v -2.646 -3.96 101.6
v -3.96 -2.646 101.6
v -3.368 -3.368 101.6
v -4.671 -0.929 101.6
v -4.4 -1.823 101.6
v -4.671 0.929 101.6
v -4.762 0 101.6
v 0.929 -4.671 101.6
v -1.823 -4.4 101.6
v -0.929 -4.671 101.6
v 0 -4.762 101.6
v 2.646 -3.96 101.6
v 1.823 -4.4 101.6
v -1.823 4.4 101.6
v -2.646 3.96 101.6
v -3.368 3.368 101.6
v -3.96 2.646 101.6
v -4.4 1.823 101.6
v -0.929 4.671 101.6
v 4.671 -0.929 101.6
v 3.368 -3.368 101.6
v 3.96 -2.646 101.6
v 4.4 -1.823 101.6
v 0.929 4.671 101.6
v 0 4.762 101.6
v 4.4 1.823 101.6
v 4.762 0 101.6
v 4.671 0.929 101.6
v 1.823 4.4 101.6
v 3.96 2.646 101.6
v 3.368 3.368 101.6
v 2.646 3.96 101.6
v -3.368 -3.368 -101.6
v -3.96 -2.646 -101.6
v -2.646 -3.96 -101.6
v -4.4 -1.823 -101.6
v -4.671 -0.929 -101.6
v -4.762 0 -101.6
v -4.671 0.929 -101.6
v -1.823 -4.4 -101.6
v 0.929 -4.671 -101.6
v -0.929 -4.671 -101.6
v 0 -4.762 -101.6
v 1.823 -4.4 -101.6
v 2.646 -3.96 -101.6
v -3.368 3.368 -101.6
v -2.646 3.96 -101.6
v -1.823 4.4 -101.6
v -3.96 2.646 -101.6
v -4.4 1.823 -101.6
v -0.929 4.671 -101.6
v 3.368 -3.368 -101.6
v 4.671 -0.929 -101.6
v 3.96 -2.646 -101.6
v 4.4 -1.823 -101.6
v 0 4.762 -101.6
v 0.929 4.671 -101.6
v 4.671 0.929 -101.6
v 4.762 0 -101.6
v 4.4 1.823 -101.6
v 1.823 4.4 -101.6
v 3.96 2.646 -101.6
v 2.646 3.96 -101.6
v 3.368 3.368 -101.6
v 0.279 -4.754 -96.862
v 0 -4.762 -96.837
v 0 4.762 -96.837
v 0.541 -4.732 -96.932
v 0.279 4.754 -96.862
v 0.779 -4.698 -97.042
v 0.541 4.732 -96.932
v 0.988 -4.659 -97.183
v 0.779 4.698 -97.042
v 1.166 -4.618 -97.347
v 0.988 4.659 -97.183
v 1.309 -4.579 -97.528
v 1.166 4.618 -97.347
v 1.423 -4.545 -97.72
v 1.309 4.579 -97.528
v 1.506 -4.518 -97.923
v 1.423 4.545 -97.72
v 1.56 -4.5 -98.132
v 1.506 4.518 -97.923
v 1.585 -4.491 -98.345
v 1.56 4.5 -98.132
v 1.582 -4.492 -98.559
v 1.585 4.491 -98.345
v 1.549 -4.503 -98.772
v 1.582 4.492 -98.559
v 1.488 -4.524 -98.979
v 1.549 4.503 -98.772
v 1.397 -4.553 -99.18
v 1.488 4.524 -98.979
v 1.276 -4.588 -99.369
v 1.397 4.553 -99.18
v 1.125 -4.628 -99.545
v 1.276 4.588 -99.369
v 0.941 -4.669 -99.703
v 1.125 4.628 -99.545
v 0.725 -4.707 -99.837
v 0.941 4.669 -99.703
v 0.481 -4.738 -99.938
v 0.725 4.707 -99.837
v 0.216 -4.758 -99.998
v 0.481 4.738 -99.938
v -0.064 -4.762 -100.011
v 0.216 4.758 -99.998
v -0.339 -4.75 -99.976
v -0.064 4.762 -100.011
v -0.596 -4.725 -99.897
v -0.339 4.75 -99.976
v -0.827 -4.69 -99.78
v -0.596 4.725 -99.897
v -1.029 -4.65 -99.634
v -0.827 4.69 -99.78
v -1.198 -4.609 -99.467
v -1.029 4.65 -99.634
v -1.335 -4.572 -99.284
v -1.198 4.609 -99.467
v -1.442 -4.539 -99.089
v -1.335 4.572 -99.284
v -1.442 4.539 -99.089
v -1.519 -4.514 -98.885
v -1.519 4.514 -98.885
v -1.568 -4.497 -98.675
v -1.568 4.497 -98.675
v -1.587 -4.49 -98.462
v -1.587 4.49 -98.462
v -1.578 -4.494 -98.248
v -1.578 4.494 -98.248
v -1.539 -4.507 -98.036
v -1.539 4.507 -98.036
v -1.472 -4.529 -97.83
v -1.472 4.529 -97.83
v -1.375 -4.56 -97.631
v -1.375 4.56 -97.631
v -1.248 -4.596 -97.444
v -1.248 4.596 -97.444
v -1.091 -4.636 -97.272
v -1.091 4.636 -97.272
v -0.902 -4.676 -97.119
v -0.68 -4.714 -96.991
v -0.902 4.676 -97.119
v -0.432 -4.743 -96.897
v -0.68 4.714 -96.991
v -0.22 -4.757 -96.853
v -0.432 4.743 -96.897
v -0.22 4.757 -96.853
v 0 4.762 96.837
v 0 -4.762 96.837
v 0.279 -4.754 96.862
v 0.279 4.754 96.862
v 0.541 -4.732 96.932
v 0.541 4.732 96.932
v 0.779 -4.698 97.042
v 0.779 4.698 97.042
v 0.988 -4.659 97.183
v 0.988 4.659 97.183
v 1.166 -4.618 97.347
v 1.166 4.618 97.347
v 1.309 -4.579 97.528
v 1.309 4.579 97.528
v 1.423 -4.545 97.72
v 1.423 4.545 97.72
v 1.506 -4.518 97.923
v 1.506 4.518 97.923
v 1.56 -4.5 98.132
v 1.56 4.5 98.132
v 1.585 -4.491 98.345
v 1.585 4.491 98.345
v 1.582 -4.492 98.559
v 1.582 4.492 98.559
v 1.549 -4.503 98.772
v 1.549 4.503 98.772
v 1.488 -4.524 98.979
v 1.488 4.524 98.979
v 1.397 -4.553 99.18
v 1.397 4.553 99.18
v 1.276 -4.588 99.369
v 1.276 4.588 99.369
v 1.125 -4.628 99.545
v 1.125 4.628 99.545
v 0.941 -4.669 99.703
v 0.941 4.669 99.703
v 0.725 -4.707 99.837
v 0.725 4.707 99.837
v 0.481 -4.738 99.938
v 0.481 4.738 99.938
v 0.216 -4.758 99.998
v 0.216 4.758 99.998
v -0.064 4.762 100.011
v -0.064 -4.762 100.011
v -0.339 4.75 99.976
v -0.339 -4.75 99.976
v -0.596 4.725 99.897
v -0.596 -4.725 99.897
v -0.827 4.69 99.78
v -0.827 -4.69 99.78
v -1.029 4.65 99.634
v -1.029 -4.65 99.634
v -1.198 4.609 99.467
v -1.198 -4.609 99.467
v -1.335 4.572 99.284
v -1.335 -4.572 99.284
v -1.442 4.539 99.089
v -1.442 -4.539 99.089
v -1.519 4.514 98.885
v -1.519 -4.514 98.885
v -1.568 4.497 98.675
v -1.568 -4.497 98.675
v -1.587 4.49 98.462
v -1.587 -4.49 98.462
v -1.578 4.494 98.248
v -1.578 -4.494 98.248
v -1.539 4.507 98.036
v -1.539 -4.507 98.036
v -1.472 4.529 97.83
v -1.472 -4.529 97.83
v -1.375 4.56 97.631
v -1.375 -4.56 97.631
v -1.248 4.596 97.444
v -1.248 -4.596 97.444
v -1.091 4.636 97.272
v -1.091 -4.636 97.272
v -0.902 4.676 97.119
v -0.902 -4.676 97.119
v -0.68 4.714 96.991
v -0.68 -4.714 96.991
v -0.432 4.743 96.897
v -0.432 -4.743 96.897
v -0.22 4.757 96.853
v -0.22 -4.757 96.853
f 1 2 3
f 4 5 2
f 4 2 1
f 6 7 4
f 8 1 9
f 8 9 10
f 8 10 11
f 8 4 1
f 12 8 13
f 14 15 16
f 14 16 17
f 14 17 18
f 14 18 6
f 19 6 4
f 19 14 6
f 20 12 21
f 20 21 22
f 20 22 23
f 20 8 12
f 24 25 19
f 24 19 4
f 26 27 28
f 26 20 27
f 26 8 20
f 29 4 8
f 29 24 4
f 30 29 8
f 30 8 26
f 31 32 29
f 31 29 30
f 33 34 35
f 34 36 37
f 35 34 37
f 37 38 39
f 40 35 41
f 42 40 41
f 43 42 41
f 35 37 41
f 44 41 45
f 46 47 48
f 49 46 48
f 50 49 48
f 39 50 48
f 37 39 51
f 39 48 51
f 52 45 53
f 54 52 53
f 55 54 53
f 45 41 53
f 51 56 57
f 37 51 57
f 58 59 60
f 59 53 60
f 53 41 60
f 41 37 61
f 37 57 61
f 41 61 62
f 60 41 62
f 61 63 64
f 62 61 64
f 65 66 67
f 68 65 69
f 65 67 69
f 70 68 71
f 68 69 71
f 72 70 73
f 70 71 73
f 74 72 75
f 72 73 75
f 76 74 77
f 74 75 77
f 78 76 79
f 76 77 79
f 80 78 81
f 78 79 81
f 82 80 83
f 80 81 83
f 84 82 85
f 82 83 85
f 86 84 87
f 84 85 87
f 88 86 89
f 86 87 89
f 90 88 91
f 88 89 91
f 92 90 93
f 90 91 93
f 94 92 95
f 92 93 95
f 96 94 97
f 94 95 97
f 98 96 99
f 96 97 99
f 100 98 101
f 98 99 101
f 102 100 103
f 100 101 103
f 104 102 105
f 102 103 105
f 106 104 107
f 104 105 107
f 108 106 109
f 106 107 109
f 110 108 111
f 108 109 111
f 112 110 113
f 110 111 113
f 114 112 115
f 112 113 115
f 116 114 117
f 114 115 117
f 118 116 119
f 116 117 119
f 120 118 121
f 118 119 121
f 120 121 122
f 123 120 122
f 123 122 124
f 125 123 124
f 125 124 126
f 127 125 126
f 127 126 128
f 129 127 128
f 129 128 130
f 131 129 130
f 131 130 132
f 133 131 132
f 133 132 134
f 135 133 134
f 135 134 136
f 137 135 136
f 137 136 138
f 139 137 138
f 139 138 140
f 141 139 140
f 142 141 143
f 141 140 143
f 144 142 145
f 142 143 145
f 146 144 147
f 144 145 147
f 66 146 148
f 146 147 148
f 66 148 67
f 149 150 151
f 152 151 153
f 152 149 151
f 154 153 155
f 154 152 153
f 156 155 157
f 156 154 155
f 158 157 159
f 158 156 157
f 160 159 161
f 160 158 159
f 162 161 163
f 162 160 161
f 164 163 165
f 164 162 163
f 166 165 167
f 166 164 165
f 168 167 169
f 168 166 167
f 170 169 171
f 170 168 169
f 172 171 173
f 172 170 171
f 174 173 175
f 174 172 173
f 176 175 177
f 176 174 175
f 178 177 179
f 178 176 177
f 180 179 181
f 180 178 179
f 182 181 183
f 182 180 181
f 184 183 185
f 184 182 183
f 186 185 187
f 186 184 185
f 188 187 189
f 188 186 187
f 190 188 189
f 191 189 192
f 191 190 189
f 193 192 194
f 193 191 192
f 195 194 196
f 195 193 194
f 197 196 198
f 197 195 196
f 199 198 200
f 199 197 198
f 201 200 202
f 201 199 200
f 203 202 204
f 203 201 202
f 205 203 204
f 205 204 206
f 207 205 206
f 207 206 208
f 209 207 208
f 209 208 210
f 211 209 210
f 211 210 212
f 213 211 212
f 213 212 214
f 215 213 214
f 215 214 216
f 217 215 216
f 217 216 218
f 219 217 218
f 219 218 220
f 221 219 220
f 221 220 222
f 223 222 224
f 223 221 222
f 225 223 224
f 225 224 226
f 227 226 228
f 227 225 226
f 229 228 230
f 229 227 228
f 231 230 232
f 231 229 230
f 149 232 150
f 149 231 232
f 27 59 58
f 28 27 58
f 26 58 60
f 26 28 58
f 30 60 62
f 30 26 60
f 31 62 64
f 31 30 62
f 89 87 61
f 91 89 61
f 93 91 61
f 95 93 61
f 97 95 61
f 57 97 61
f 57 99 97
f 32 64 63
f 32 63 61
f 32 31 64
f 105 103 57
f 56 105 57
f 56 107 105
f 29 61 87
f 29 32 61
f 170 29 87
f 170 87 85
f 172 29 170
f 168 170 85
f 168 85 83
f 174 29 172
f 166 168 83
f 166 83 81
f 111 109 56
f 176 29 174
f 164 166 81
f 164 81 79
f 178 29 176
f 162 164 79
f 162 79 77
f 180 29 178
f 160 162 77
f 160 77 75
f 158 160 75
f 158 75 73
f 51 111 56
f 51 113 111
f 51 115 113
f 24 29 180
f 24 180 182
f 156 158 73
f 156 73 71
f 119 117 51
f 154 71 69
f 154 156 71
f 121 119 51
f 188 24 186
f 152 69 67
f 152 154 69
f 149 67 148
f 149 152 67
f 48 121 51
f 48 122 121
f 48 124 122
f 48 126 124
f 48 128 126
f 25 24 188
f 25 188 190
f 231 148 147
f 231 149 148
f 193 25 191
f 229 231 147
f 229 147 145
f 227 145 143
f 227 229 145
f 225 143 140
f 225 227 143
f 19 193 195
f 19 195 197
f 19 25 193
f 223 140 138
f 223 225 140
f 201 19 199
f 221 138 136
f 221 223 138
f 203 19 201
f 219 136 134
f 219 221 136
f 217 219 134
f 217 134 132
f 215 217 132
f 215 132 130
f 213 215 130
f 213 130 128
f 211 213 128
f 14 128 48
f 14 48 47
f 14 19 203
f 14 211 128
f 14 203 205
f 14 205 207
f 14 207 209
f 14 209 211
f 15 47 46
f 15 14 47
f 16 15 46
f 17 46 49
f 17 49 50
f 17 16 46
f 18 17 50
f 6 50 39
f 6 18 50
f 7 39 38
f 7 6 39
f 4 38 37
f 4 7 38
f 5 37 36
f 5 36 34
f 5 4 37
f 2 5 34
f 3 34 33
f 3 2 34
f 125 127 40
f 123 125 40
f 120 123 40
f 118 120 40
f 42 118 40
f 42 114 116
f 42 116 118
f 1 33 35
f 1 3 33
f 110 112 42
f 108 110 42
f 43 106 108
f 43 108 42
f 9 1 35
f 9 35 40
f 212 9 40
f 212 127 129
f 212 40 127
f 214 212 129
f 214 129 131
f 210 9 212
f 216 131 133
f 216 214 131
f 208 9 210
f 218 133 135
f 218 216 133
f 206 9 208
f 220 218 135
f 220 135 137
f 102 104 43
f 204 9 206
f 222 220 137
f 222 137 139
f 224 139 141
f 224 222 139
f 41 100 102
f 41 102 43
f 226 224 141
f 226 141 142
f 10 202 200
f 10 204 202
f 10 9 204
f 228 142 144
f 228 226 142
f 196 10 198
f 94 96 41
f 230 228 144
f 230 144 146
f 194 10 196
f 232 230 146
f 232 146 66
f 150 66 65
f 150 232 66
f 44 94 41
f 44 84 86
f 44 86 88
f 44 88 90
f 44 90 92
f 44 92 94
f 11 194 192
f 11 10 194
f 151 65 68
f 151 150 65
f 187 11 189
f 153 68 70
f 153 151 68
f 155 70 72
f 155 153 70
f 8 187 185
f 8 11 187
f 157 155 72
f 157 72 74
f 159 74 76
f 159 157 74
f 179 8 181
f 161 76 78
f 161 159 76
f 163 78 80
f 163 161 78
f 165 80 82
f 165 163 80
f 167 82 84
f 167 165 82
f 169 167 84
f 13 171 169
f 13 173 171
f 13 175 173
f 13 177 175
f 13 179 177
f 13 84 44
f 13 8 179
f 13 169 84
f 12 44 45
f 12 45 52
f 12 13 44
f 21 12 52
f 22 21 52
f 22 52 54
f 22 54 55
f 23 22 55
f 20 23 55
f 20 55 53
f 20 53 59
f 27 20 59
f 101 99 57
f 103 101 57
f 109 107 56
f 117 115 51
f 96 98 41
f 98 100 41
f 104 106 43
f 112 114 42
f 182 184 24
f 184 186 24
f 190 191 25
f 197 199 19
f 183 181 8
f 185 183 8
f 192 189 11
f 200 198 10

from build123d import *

# Parameters (mm, degrees)
SKETCH1_R             = 4.7625
BOSS_EXTRUDE1_DEPTH   = 101.6
SKETCH2_R             = 1.5875
SPLIT_RING_HOLE_DEPTH = 102.822997464


with BuildPart() as part:
    # Sketch1 → Boss-Extrude1 (new, symmetric)
    with BuildSketch(Plane.XY):
        Circle(SKETCH1_R)
    extrude(amount=BOSS_EXTRUDE1_DEPTH, both=True)

    # Sketch2 → Split Ring Hole (cut, symmetric)
    with BuildSketch(Plane(origin=(0, 0, 0), x_dir=(1, 0, 0), z_dir=(0, 1, 0))):
        with Locations(Location((0, 98.425, 0), (0, 0, 270))):
            Circle(SKETCH2_R)
    split_ring_hole = extrude(amount=SPLIT_RING_HOLE_DEPTH, both=True, mode=Mode.SUBTRACT)

    # Mirror1: Split Ring Hole across plane
    add(split_ring_hole.mirror(Plane.XY), mode=Mode.SUBTRACT)


solid = part.part
